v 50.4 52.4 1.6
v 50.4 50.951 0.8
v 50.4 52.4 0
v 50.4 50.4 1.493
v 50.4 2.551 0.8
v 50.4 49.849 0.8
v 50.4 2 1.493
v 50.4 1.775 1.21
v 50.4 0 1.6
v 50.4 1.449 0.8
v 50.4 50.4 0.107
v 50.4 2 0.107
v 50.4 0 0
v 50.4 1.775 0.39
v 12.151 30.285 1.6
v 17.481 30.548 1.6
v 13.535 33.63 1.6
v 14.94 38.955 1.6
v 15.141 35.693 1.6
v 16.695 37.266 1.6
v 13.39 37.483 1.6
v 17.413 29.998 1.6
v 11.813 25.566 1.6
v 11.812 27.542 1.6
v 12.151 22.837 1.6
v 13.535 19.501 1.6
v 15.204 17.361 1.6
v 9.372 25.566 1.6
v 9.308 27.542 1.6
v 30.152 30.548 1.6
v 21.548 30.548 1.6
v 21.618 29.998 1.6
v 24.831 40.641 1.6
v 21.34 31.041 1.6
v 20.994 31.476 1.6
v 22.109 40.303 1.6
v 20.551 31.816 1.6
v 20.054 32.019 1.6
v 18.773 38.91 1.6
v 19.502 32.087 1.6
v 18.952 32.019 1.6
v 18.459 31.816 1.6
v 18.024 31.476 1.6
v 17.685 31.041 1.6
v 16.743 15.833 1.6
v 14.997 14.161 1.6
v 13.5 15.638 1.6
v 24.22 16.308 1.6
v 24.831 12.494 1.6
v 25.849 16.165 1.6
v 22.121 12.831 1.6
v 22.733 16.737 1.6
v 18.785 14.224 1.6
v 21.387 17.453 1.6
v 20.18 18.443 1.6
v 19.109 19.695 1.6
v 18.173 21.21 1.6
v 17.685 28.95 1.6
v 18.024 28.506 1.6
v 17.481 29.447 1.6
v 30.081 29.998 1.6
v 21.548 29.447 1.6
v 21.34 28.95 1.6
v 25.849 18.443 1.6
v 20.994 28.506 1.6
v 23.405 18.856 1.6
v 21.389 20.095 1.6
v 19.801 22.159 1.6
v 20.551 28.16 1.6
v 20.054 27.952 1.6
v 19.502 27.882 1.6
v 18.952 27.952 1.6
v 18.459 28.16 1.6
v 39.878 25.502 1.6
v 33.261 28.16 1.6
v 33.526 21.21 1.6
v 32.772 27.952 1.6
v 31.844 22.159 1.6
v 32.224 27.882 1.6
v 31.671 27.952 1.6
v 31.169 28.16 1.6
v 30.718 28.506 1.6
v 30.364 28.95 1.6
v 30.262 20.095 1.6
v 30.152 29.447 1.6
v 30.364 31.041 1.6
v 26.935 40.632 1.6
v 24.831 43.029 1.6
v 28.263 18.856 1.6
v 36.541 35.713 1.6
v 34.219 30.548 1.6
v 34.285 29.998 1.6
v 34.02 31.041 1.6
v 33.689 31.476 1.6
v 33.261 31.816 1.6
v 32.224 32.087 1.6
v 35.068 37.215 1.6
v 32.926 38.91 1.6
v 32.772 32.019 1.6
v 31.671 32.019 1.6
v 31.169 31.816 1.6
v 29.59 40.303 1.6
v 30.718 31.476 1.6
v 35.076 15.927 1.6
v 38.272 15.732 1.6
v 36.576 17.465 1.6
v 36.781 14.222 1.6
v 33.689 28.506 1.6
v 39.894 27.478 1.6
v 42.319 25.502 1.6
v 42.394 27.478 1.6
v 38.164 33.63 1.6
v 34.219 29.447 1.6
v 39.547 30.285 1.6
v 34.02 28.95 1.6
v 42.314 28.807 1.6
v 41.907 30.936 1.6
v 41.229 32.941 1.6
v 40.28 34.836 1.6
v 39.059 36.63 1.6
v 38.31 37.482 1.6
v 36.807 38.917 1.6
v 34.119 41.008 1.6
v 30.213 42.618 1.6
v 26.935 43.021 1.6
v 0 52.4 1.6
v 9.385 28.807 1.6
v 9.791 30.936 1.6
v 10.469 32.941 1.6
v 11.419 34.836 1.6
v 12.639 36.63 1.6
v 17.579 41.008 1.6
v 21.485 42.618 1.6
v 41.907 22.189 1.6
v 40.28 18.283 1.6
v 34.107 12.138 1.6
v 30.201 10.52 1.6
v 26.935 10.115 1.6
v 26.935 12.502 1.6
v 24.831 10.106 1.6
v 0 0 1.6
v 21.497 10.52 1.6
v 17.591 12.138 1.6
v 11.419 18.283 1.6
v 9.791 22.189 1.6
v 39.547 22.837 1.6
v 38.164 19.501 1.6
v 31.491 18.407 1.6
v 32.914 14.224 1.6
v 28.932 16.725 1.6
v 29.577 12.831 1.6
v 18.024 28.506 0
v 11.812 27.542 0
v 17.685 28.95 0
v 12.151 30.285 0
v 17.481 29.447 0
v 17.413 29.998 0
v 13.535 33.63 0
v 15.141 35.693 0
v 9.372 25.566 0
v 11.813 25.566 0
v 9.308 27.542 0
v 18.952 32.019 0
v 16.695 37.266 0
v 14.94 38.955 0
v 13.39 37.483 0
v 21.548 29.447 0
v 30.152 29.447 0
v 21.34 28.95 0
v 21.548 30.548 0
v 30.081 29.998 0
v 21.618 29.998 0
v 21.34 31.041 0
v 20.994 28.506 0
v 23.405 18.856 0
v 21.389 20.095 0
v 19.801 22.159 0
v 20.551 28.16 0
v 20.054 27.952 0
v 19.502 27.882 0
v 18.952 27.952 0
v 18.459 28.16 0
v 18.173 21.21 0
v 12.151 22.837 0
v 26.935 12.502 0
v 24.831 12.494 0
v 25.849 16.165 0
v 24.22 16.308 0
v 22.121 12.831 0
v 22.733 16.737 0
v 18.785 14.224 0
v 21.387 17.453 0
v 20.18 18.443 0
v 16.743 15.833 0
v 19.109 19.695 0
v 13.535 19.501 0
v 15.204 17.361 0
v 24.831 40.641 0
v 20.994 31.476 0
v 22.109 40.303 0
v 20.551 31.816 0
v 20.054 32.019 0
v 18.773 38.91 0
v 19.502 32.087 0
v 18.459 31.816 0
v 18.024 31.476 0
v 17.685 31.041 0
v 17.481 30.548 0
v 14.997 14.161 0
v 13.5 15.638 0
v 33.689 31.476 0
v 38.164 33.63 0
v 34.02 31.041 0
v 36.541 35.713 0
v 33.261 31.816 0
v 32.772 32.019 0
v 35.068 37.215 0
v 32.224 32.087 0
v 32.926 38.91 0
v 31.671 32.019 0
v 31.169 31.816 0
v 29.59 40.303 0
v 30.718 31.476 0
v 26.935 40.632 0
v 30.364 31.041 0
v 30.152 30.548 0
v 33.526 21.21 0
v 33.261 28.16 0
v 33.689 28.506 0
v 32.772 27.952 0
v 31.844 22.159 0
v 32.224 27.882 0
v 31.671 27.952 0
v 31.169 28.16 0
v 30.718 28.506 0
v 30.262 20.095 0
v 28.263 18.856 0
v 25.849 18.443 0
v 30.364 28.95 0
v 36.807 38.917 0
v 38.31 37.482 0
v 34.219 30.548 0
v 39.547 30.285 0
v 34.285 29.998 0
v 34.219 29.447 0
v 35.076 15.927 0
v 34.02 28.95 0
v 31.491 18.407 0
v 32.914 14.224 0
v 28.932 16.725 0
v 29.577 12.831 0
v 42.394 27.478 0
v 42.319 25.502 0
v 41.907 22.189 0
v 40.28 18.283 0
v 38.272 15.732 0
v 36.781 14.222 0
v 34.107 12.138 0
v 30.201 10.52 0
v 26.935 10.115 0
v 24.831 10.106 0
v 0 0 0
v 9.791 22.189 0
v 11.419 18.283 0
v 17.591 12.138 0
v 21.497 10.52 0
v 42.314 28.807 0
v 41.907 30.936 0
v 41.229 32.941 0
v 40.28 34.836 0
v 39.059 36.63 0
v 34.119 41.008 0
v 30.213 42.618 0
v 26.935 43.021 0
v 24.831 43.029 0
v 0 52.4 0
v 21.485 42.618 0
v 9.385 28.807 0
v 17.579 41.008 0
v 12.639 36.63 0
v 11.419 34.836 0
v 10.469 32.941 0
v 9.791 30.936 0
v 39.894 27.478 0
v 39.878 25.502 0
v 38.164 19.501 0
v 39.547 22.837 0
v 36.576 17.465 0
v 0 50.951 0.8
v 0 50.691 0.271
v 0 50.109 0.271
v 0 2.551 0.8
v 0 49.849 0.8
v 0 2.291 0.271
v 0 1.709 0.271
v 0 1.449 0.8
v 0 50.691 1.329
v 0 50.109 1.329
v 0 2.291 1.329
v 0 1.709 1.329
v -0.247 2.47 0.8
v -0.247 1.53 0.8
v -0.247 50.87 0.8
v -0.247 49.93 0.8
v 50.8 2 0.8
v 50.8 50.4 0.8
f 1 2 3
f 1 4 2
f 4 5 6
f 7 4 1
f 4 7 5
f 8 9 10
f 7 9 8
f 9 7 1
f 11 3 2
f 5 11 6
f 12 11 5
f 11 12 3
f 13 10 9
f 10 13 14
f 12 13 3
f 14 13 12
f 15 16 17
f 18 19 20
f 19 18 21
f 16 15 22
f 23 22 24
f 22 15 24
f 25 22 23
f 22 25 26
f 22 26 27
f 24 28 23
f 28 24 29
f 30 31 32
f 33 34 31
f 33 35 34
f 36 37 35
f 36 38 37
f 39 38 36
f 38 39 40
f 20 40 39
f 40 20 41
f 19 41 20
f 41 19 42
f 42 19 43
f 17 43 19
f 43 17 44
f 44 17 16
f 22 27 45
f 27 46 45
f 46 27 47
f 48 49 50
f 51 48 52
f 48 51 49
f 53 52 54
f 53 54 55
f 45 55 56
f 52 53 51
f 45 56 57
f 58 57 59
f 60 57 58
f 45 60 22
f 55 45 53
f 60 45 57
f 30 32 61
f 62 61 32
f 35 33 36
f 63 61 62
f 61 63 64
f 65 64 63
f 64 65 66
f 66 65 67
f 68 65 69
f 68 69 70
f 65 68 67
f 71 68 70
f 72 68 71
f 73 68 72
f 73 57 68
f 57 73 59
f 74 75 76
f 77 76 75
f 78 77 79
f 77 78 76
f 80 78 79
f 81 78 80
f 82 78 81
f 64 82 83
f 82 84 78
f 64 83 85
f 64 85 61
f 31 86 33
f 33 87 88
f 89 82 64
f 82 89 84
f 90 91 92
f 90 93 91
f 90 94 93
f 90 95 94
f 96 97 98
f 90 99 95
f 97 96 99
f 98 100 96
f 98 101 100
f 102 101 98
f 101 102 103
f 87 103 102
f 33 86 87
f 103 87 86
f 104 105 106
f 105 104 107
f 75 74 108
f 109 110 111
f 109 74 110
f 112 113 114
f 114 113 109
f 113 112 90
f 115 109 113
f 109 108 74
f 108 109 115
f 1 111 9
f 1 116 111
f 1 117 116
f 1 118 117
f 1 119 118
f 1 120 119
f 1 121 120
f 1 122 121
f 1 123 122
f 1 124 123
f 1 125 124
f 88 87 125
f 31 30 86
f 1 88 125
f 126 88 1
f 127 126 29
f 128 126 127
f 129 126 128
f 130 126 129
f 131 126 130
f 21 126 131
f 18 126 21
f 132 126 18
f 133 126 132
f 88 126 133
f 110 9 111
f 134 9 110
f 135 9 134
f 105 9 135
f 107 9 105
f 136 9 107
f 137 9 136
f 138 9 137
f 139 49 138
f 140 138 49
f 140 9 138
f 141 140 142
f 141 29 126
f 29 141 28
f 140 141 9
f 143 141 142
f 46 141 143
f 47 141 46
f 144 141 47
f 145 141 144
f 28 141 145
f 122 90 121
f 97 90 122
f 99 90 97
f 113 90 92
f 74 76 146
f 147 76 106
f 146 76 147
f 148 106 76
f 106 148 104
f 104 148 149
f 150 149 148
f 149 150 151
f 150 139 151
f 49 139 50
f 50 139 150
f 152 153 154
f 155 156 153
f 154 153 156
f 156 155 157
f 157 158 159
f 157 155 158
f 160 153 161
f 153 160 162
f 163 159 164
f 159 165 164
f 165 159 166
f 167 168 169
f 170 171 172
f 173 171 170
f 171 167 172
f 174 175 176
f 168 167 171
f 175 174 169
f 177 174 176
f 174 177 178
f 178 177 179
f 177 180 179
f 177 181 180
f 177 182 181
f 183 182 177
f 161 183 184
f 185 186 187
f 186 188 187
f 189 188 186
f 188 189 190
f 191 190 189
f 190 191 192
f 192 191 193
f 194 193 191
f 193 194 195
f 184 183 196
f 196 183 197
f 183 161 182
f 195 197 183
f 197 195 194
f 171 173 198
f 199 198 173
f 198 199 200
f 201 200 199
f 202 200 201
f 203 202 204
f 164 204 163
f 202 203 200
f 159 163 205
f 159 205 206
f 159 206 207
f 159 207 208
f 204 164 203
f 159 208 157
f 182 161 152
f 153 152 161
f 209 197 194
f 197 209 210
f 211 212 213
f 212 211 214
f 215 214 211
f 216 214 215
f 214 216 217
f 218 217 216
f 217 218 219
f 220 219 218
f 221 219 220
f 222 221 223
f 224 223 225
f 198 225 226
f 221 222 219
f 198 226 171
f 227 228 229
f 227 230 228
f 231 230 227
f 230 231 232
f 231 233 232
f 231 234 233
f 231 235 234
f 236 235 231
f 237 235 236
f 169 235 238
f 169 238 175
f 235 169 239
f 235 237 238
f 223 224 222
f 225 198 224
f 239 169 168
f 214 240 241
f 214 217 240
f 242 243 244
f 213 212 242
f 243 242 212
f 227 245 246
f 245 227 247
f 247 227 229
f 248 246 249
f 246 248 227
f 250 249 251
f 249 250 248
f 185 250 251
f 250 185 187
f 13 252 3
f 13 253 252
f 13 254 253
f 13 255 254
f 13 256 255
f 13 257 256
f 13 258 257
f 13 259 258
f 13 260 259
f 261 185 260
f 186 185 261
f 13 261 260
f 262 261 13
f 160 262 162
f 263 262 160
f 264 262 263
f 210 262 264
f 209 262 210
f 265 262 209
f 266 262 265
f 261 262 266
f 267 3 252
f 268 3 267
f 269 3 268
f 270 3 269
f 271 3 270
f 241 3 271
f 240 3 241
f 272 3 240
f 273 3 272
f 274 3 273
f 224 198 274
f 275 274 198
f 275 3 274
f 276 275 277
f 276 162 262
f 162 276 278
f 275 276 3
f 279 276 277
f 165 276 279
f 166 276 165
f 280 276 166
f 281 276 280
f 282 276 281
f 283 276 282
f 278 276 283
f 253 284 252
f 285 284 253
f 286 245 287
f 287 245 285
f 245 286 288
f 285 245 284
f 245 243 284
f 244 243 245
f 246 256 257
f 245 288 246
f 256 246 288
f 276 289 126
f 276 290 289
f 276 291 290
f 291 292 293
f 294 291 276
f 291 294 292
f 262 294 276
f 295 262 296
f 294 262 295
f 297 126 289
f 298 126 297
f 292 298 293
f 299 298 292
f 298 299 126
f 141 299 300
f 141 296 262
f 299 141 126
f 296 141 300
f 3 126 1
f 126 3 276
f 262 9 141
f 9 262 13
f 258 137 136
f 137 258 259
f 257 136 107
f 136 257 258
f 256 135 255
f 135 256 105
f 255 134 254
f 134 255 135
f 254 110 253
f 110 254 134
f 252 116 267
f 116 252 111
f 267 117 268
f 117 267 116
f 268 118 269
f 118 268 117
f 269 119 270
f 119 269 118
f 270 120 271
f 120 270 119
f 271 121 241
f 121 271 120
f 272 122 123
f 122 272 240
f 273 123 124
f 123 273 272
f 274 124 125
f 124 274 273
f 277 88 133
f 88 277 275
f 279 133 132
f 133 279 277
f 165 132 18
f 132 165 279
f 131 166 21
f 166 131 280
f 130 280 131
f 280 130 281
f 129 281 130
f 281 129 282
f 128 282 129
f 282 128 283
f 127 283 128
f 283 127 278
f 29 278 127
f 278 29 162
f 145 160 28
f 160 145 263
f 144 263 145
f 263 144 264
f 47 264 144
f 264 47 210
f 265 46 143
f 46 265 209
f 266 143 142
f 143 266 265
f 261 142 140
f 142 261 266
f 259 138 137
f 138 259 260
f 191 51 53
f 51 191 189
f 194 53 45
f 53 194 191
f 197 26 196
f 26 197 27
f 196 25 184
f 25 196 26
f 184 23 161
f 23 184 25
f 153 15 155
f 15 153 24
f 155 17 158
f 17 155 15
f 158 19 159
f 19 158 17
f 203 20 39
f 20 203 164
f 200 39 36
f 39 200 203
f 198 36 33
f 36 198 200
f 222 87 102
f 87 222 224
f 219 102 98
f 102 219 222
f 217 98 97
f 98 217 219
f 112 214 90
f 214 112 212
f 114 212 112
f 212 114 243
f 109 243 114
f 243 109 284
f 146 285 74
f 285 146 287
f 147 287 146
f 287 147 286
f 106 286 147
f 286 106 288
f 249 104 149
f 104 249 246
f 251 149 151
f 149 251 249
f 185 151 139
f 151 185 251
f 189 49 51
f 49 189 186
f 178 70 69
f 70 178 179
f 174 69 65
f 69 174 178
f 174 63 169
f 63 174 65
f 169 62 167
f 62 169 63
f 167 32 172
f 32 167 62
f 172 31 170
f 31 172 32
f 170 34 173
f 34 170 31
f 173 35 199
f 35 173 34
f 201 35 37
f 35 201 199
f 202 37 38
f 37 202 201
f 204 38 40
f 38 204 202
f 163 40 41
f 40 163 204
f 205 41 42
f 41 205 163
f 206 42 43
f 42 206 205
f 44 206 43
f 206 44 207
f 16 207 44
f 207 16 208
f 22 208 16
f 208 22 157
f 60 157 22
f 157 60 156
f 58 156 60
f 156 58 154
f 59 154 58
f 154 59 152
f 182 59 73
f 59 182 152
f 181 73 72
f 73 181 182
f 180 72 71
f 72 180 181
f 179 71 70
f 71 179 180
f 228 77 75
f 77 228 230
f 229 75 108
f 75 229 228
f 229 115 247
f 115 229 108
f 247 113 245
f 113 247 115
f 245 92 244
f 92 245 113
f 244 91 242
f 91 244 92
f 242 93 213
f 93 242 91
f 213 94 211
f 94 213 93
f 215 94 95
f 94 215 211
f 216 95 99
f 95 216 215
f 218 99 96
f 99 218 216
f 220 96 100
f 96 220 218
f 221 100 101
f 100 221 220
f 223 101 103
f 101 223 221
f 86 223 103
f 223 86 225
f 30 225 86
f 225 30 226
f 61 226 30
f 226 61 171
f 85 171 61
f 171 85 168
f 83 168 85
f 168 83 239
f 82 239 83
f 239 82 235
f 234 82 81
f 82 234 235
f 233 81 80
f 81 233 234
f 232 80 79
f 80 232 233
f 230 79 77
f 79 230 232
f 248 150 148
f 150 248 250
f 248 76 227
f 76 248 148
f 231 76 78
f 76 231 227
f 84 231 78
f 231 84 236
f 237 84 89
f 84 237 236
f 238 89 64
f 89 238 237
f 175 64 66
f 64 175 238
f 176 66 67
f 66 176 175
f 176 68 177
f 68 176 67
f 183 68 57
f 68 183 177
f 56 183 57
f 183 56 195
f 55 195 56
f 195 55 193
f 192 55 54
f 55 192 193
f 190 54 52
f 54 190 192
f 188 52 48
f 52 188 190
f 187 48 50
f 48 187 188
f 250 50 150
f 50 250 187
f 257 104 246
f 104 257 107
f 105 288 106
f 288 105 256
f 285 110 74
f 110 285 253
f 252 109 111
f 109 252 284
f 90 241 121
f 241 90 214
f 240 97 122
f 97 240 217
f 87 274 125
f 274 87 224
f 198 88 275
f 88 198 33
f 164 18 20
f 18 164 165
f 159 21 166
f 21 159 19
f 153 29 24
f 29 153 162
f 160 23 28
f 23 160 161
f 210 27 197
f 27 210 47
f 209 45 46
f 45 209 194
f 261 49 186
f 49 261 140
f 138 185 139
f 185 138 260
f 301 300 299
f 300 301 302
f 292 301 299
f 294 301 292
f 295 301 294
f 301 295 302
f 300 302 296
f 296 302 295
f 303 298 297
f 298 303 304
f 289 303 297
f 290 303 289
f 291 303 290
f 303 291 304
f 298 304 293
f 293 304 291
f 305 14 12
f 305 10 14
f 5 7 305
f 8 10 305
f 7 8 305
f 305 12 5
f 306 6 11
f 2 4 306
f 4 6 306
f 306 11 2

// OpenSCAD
echo(version=version());

font = "Liberation Sans";

module letter(letter_size, letter_height, l) {
  linear_extrude(height = letter_height) {
    text(l, size = letter_size, font = font, halign = "center", valign = "center", $fn = 16);
  }
}

//difference() {
//  translate([-27,-27,0])
//    cube([54, 54, 20]);
//  translate([0, -27, 10])      
//    rotate([90, 0, 0])
//        letter(8,2,"Genesys");
//  translate([-25,-25,2])
//    cube([50, 50, 30]);
//  
//  translate([-25,-10,18]) cube([50, 50, 10]);
//  #translate([-25,-26,18])
//    cube([50, 53, 2]);
//}

// translate([-25,-25,0]) cube([4, 4, 3]);
// translate([21,-25,0])  cube([4, 4, 3]);
// translate([-25,21,0])  cube([4, 4, 3]);
// translate([21,21,0])   cube([4, 4, 3]);

// 
// translate([50,-26,0])
union() {
    difference() {
        cube([50.4, 52.4, 1.6]);
        translate([25.2, 26.2, 0]) 
            letter(40,4,"\u263A");    
    }        
    translate([25.2, 26.2, 0]) 
        letter(47,1.6,"\u263C");
    
    translate([0.4, 2, 0.8]) sphere(r = 0.8);
    translate([0.4, 50.4, 0.8]) sphere(r = 0.8);
    translate([50, 2, 0.8]) sphere(r = 0.8);
    translate([50, 50.4, 0.8]) sphere(r = 0.8);
}
